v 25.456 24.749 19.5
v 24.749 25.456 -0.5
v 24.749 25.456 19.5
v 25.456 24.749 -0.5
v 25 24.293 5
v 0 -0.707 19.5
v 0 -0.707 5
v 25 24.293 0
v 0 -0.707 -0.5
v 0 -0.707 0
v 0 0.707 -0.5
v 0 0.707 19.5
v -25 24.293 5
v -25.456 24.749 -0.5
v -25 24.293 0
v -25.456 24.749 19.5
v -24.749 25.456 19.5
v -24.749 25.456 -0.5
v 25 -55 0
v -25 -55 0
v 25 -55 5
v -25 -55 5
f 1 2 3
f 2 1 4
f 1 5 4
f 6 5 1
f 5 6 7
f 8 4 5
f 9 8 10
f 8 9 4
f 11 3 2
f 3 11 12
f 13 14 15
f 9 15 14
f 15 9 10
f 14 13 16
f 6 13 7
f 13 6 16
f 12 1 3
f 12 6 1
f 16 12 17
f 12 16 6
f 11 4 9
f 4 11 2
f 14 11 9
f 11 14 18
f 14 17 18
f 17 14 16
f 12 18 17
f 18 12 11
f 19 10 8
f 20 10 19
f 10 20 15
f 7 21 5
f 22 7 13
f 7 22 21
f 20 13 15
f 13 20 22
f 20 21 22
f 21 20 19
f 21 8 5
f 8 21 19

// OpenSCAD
$fn=16;

rotate([90,0,45]) translate ([-0.5,-0.5,-0.5]) cube([36,20,1]);
rotate([90,0,135])  translate ([-0.5,-0.5,-0.5]) cube([36,20,1]);

linear_extrude(5) polygon(points=[[0,0], [25,25], [25, -55], [-25,-55], [-25, 25]] );
